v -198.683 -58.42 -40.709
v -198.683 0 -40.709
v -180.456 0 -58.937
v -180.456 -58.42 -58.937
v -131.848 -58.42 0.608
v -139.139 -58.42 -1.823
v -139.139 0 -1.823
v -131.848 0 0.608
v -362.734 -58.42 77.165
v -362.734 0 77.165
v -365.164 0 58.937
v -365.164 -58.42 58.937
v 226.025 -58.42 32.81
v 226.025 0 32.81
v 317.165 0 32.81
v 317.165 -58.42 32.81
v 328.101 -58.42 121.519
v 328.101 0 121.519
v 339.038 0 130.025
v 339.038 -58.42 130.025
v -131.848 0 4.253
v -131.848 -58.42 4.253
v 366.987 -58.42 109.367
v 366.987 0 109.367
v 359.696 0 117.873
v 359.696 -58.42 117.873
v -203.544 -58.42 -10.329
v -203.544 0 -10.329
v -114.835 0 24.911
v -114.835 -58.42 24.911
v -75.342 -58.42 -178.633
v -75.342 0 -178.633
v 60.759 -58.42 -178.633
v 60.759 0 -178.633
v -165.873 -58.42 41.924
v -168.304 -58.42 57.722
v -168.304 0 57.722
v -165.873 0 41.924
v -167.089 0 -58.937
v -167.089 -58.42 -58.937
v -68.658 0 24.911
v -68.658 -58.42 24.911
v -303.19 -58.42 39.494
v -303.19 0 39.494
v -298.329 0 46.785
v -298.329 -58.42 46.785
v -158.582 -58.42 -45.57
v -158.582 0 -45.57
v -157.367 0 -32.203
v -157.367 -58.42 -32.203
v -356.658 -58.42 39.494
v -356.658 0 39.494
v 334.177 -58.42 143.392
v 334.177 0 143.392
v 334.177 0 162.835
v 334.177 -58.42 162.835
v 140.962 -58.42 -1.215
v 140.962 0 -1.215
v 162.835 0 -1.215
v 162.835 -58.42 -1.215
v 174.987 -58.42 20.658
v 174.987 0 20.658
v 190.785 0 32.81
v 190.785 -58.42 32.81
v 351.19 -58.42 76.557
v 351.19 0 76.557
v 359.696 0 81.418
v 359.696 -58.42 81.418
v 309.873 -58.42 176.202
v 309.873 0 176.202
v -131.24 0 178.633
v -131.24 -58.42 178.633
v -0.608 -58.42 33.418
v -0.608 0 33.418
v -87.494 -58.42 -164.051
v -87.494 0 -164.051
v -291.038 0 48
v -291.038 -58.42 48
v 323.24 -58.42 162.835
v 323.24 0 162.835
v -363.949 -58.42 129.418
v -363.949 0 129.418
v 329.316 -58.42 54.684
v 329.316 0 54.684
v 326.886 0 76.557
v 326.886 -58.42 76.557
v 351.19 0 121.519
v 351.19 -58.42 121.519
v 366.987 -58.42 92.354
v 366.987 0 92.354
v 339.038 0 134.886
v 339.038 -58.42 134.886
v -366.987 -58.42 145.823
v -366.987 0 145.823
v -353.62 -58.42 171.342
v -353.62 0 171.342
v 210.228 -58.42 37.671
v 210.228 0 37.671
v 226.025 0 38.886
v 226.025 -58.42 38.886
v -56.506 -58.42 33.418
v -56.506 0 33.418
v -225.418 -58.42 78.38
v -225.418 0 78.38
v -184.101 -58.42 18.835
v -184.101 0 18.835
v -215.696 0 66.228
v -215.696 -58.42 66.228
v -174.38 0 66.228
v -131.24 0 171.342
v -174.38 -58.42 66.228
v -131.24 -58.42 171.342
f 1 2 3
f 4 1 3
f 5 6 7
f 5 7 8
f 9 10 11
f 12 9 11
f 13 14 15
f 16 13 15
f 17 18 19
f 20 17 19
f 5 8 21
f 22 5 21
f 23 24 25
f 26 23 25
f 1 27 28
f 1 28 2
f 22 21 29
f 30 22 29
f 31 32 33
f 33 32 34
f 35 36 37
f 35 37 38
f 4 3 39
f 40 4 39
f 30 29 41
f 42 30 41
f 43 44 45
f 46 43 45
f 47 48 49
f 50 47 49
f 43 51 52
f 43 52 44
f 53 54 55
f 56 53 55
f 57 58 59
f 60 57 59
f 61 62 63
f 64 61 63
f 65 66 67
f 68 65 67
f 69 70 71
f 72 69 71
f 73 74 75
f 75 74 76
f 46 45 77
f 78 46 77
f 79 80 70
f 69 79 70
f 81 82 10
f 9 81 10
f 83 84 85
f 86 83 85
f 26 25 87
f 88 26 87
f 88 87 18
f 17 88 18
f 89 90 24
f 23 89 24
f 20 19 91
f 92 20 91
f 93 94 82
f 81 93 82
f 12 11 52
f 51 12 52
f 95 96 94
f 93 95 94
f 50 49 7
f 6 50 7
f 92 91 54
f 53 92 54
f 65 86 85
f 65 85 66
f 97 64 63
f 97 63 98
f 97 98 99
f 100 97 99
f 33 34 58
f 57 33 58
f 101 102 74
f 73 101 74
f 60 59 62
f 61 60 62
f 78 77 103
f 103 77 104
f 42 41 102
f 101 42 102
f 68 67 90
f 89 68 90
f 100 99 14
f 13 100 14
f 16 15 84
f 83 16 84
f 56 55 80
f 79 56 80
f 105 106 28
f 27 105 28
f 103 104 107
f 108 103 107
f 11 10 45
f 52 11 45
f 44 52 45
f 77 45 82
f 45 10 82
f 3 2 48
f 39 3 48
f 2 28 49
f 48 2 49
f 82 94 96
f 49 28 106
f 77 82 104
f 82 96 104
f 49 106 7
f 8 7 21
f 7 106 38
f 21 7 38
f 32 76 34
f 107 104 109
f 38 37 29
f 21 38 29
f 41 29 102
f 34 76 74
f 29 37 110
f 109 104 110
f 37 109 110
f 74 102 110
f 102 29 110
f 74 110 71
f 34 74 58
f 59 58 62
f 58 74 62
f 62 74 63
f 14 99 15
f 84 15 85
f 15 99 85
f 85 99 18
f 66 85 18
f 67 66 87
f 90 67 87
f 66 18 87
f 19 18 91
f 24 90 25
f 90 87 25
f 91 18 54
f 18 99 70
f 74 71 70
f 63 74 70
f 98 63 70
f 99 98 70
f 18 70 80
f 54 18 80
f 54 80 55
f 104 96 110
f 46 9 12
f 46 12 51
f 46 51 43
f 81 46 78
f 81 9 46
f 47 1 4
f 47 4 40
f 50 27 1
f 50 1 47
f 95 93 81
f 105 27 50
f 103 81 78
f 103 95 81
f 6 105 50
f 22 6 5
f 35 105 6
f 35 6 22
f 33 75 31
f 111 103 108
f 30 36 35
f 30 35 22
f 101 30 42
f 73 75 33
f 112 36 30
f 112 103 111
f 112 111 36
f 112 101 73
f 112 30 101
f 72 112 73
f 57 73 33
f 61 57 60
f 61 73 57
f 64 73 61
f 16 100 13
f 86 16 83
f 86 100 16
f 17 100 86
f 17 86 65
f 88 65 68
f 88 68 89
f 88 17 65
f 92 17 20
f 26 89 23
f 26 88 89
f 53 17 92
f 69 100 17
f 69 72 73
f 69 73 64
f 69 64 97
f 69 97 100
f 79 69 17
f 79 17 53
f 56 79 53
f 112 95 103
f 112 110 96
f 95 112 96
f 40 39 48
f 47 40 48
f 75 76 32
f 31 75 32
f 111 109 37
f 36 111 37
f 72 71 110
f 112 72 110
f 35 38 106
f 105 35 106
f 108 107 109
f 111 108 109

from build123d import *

# Parameters (mm, degrees)
F1_DEPTH = 58.42


with BuildPart() as f1:
    # F0 (on Front) → F1 (new body)
    with BuildSketch(Plane.XZ):
        Polygon((-353.620197, 171.341745), (-366.987277, 145.822746), (-363.949285, 129.417699), (-362.734098, 77.16454), (-365.164497, 58.936687), (-356.658164, 39.493647), (-303.189818, 39.493647), (-298.329045, 46.784793), (-291.037924, 47.99998), (-225.417685, 78.379726), (-215.696165, 66.227833), (-174.379712, 66.227833), (-168.303753, 57.7215), (-165.873379, 41.924046), (-184.101232, 18.835421), (-203.544272, -10.329113), (-198.683499, -40.708859), (-180.455646, -58.936712), (-167.088566, -58.936712), (-158.582233, -45.569632), (-157.367046, -32.202526), (-139.139219, -1.822806), (-131.848073, 0.607593), (-131.848073, 4.253154), (-114.835407, 24.91138), (-68.658207, 24.91138), (-56.506313, 33.417713), (-0.607593, 33.417713), (-87.493653, -164.050624), (-75.341759, -178.632891), (60.759492, -178.632891), (140.962024, -1.215187), (162.835438, -1.215187), (174.987331, 20.658226), (190.784785, 32.81012), (210.227824, 37.670867), (226.025304, 38.886054), (226.025304, 32.81012), (317.164517, 32.81012), (329.31641, 54.683533), (326.886037, 76.556946), (351.189823, 76.556946), (359.696156, 81.417693), (366.987303, 92.3544), (366.987303, 109.367066), (359.696156, 117.873399), (351.189823, 121.518959), (328.101223, 121.518959), (339.03793, 130.025292), (339.03793, 134.88604), (334.177183, 143.392373), (334.177183, 162.835412), (323.240476, 162.835412), (309.873371, 176.202492), (-131.240479, 178.632866), (-131.240479, 171.341745), align=None)
    extrude(amount=F1_DEPTH)


solid = f1.part
